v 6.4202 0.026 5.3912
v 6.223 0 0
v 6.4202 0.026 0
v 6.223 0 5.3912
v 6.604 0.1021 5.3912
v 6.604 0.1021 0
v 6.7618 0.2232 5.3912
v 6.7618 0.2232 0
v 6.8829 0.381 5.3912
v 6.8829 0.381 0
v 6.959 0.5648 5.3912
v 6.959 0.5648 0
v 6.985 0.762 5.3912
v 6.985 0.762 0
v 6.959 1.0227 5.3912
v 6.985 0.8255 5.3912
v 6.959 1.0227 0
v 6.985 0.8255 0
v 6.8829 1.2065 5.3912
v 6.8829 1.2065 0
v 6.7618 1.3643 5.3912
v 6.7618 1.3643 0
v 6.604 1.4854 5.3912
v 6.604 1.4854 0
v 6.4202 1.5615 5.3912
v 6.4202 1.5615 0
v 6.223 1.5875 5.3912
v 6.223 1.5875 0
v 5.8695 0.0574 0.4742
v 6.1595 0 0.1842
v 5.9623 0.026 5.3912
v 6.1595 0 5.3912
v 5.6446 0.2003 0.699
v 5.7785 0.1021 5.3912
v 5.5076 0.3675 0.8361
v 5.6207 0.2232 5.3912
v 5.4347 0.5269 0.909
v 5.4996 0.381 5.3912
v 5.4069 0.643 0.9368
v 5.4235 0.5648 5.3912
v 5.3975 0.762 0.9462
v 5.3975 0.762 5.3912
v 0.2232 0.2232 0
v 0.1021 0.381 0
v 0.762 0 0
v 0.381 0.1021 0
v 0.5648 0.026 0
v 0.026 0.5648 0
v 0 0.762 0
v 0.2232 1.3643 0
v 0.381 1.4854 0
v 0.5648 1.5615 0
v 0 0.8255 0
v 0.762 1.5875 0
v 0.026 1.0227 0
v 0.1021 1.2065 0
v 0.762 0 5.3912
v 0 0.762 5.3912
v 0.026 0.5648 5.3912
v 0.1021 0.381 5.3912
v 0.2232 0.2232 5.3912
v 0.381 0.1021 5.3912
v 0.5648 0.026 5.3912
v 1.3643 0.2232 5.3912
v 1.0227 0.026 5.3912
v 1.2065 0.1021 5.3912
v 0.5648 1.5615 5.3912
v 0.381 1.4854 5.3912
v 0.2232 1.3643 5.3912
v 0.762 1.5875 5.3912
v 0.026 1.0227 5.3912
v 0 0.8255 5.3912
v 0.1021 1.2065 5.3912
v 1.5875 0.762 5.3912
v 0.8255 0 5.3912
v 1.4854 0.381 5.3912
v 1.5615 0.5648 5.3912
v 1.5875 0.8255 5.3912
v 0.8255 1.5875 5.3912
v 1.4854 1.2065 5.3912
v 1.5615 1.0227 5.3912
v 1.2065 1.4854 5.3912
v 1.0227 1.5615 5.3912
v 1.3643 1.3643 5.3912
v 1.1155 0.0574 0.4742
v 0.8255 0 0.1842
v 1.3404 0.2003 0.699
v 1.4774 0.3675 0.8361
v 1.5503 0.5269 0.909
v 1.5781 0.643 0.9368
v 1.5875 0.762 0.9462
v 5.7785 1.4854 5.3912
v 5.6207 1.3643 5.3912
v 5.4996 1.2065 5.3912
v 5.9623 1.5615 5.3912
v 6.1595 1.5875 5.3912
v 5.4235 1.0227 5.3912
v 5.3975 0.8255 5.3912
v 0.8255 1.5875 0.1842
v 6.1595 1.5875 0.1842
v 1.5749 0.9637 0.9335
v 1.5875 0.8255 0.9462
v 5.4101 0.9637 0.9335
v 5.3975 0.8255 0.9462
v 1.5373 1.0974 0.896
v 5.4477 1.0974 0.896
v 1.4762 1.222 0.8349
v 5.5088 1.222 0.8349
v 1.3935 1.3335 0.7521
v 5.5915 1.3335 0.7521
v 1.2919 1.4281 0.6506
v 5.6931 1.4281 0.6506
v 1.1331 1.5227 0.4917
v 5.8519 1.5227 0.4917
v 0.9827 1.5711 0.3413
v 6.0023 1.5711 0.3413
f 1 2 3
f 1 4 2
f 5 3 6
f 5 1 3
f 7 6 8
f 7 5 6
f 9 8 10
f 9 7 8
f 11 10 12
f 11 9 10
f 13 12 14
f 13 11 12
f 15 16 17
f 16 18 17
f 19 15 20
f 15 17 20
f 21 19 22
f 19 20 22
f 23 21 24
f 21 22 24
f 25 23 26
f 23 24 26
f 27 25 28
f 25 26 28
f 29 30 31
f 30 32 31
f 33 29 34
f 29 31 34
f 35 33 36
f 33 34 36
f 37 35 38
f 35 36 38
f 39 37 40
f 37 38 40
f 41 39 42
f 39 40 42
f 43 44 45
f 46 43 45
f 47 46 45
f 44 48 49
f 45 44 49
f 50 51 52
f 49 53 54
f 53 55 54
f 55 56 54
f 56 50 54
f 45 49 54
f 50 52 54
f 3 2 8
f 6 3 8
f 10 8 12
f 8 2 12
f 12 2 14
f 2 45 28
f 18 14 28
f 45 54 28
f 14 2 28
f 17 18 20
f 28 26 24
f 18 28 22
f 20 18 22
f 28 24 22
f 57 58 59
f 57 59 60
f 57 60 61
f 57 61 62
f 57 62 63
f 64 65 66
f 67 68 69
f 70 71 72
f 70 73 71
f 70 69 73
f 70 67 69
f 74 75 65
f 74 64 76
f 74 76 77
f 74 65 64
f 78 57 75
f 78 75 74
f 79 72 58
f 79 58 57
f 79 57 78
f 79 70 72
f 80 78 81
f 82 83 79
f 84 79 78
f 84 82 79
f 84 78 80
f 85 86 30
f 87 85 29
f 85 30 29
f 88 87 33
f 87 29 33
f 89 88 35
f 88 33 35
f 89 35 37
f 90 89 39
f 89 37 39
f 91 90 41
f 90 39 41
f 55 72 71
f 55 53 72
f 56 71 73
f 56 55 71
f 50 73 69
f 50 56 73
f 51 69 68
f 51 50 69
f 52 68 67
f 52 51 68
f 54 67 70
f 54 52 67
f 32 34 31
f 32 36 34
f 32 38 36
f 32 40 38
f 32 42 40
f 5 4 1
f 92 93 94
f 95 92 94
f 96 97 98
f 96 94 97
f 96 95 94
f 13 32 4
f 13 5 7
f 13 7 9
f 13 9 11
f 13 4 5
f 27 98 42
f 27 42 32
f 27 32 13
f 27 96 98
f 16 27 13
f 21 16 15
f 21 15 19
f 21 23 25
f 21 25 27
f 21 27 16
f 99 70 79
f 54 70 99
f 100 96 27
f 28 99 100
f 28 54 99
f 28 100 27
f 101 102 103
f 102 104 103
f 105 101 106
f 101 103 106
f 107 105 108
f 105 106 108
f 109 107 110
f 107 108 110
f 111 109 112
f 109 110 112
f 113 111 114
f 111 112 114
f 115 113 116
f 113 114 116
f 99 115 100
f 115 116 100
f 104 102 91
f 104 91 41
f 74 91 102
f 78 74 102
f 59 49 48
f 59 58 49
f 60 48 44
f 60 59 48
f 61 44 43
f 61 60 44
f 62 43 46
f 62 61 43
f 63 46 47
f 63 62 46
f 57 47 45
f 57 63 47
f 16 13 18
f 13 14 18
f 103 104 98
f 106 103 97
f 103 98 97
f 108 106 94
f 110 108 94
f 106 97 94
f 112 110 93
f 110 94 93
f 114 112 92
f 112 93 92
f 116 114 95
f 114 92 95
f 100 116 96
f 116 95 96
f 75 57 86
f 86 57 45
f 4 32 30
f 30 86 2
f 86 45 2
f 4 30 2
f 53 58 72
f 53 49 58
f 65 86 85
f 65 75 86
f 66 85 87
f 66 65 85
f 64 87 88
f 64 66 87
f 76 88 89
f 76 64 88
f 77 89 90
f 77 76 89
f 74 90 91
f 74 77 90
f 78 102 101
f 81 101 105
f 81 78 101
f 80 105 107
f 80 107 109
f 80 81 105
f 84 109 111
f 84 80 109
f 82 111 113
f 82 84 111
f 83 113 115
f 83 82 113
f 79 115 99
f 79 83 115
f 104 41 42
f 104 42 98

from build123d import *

# Parameters (mm, degrees)
F0_W     = 6.985
F0_H     = 1.5875
F1_DEPTH = 0.94615
F2_W     = 1.5875
F2_H     = 1.5875
F3_DEPTH = 4.445
F4_R     = 0.762


with BuildPart() as f1:
    # F0 (on Top) → F1 (new body)
    with BuildSketch(Plane.XY):
        with Locations((3.4925, 0.79375)):
            Rectangle(F0_W, F0_H)
    extrude(amount=F1_DEPTH)

    # F2 (on face) → F3 (join)
    with BuildSketch(Plane.XY.offset(0.94615)):
        with Locations((0.79375, 0.79375)):
            Rectangle(F2_W, F2_H)
        with Locations((6.19125, 0.79375)):
            Rectangle(F2_W, F2_H)
    extrude(amount=F3_DEPTH)

    # F4
    f4_edges = [f1.edges().sort_by_distance(p)[0] for p in [
        (0, 0, 2.695575),
        (1.5875, 0, 3.16865),
        (3.4925, 0, 0.94615),
        (5.3975, 0, 3.16865),
        (6.985, 0, 2.695575),
        (0, 1.5875, 2.695575),
        (1.5875, 1.5875, 3.16865),
        (3.4925, 1.5875, 0.94615),
        (5.3975, 1.5875, 3.16865),
        (6.985, 1.5875, 2.695575),
    ]]
    fillet(f4_edges, radius=F4_R)


solid = f1.part
